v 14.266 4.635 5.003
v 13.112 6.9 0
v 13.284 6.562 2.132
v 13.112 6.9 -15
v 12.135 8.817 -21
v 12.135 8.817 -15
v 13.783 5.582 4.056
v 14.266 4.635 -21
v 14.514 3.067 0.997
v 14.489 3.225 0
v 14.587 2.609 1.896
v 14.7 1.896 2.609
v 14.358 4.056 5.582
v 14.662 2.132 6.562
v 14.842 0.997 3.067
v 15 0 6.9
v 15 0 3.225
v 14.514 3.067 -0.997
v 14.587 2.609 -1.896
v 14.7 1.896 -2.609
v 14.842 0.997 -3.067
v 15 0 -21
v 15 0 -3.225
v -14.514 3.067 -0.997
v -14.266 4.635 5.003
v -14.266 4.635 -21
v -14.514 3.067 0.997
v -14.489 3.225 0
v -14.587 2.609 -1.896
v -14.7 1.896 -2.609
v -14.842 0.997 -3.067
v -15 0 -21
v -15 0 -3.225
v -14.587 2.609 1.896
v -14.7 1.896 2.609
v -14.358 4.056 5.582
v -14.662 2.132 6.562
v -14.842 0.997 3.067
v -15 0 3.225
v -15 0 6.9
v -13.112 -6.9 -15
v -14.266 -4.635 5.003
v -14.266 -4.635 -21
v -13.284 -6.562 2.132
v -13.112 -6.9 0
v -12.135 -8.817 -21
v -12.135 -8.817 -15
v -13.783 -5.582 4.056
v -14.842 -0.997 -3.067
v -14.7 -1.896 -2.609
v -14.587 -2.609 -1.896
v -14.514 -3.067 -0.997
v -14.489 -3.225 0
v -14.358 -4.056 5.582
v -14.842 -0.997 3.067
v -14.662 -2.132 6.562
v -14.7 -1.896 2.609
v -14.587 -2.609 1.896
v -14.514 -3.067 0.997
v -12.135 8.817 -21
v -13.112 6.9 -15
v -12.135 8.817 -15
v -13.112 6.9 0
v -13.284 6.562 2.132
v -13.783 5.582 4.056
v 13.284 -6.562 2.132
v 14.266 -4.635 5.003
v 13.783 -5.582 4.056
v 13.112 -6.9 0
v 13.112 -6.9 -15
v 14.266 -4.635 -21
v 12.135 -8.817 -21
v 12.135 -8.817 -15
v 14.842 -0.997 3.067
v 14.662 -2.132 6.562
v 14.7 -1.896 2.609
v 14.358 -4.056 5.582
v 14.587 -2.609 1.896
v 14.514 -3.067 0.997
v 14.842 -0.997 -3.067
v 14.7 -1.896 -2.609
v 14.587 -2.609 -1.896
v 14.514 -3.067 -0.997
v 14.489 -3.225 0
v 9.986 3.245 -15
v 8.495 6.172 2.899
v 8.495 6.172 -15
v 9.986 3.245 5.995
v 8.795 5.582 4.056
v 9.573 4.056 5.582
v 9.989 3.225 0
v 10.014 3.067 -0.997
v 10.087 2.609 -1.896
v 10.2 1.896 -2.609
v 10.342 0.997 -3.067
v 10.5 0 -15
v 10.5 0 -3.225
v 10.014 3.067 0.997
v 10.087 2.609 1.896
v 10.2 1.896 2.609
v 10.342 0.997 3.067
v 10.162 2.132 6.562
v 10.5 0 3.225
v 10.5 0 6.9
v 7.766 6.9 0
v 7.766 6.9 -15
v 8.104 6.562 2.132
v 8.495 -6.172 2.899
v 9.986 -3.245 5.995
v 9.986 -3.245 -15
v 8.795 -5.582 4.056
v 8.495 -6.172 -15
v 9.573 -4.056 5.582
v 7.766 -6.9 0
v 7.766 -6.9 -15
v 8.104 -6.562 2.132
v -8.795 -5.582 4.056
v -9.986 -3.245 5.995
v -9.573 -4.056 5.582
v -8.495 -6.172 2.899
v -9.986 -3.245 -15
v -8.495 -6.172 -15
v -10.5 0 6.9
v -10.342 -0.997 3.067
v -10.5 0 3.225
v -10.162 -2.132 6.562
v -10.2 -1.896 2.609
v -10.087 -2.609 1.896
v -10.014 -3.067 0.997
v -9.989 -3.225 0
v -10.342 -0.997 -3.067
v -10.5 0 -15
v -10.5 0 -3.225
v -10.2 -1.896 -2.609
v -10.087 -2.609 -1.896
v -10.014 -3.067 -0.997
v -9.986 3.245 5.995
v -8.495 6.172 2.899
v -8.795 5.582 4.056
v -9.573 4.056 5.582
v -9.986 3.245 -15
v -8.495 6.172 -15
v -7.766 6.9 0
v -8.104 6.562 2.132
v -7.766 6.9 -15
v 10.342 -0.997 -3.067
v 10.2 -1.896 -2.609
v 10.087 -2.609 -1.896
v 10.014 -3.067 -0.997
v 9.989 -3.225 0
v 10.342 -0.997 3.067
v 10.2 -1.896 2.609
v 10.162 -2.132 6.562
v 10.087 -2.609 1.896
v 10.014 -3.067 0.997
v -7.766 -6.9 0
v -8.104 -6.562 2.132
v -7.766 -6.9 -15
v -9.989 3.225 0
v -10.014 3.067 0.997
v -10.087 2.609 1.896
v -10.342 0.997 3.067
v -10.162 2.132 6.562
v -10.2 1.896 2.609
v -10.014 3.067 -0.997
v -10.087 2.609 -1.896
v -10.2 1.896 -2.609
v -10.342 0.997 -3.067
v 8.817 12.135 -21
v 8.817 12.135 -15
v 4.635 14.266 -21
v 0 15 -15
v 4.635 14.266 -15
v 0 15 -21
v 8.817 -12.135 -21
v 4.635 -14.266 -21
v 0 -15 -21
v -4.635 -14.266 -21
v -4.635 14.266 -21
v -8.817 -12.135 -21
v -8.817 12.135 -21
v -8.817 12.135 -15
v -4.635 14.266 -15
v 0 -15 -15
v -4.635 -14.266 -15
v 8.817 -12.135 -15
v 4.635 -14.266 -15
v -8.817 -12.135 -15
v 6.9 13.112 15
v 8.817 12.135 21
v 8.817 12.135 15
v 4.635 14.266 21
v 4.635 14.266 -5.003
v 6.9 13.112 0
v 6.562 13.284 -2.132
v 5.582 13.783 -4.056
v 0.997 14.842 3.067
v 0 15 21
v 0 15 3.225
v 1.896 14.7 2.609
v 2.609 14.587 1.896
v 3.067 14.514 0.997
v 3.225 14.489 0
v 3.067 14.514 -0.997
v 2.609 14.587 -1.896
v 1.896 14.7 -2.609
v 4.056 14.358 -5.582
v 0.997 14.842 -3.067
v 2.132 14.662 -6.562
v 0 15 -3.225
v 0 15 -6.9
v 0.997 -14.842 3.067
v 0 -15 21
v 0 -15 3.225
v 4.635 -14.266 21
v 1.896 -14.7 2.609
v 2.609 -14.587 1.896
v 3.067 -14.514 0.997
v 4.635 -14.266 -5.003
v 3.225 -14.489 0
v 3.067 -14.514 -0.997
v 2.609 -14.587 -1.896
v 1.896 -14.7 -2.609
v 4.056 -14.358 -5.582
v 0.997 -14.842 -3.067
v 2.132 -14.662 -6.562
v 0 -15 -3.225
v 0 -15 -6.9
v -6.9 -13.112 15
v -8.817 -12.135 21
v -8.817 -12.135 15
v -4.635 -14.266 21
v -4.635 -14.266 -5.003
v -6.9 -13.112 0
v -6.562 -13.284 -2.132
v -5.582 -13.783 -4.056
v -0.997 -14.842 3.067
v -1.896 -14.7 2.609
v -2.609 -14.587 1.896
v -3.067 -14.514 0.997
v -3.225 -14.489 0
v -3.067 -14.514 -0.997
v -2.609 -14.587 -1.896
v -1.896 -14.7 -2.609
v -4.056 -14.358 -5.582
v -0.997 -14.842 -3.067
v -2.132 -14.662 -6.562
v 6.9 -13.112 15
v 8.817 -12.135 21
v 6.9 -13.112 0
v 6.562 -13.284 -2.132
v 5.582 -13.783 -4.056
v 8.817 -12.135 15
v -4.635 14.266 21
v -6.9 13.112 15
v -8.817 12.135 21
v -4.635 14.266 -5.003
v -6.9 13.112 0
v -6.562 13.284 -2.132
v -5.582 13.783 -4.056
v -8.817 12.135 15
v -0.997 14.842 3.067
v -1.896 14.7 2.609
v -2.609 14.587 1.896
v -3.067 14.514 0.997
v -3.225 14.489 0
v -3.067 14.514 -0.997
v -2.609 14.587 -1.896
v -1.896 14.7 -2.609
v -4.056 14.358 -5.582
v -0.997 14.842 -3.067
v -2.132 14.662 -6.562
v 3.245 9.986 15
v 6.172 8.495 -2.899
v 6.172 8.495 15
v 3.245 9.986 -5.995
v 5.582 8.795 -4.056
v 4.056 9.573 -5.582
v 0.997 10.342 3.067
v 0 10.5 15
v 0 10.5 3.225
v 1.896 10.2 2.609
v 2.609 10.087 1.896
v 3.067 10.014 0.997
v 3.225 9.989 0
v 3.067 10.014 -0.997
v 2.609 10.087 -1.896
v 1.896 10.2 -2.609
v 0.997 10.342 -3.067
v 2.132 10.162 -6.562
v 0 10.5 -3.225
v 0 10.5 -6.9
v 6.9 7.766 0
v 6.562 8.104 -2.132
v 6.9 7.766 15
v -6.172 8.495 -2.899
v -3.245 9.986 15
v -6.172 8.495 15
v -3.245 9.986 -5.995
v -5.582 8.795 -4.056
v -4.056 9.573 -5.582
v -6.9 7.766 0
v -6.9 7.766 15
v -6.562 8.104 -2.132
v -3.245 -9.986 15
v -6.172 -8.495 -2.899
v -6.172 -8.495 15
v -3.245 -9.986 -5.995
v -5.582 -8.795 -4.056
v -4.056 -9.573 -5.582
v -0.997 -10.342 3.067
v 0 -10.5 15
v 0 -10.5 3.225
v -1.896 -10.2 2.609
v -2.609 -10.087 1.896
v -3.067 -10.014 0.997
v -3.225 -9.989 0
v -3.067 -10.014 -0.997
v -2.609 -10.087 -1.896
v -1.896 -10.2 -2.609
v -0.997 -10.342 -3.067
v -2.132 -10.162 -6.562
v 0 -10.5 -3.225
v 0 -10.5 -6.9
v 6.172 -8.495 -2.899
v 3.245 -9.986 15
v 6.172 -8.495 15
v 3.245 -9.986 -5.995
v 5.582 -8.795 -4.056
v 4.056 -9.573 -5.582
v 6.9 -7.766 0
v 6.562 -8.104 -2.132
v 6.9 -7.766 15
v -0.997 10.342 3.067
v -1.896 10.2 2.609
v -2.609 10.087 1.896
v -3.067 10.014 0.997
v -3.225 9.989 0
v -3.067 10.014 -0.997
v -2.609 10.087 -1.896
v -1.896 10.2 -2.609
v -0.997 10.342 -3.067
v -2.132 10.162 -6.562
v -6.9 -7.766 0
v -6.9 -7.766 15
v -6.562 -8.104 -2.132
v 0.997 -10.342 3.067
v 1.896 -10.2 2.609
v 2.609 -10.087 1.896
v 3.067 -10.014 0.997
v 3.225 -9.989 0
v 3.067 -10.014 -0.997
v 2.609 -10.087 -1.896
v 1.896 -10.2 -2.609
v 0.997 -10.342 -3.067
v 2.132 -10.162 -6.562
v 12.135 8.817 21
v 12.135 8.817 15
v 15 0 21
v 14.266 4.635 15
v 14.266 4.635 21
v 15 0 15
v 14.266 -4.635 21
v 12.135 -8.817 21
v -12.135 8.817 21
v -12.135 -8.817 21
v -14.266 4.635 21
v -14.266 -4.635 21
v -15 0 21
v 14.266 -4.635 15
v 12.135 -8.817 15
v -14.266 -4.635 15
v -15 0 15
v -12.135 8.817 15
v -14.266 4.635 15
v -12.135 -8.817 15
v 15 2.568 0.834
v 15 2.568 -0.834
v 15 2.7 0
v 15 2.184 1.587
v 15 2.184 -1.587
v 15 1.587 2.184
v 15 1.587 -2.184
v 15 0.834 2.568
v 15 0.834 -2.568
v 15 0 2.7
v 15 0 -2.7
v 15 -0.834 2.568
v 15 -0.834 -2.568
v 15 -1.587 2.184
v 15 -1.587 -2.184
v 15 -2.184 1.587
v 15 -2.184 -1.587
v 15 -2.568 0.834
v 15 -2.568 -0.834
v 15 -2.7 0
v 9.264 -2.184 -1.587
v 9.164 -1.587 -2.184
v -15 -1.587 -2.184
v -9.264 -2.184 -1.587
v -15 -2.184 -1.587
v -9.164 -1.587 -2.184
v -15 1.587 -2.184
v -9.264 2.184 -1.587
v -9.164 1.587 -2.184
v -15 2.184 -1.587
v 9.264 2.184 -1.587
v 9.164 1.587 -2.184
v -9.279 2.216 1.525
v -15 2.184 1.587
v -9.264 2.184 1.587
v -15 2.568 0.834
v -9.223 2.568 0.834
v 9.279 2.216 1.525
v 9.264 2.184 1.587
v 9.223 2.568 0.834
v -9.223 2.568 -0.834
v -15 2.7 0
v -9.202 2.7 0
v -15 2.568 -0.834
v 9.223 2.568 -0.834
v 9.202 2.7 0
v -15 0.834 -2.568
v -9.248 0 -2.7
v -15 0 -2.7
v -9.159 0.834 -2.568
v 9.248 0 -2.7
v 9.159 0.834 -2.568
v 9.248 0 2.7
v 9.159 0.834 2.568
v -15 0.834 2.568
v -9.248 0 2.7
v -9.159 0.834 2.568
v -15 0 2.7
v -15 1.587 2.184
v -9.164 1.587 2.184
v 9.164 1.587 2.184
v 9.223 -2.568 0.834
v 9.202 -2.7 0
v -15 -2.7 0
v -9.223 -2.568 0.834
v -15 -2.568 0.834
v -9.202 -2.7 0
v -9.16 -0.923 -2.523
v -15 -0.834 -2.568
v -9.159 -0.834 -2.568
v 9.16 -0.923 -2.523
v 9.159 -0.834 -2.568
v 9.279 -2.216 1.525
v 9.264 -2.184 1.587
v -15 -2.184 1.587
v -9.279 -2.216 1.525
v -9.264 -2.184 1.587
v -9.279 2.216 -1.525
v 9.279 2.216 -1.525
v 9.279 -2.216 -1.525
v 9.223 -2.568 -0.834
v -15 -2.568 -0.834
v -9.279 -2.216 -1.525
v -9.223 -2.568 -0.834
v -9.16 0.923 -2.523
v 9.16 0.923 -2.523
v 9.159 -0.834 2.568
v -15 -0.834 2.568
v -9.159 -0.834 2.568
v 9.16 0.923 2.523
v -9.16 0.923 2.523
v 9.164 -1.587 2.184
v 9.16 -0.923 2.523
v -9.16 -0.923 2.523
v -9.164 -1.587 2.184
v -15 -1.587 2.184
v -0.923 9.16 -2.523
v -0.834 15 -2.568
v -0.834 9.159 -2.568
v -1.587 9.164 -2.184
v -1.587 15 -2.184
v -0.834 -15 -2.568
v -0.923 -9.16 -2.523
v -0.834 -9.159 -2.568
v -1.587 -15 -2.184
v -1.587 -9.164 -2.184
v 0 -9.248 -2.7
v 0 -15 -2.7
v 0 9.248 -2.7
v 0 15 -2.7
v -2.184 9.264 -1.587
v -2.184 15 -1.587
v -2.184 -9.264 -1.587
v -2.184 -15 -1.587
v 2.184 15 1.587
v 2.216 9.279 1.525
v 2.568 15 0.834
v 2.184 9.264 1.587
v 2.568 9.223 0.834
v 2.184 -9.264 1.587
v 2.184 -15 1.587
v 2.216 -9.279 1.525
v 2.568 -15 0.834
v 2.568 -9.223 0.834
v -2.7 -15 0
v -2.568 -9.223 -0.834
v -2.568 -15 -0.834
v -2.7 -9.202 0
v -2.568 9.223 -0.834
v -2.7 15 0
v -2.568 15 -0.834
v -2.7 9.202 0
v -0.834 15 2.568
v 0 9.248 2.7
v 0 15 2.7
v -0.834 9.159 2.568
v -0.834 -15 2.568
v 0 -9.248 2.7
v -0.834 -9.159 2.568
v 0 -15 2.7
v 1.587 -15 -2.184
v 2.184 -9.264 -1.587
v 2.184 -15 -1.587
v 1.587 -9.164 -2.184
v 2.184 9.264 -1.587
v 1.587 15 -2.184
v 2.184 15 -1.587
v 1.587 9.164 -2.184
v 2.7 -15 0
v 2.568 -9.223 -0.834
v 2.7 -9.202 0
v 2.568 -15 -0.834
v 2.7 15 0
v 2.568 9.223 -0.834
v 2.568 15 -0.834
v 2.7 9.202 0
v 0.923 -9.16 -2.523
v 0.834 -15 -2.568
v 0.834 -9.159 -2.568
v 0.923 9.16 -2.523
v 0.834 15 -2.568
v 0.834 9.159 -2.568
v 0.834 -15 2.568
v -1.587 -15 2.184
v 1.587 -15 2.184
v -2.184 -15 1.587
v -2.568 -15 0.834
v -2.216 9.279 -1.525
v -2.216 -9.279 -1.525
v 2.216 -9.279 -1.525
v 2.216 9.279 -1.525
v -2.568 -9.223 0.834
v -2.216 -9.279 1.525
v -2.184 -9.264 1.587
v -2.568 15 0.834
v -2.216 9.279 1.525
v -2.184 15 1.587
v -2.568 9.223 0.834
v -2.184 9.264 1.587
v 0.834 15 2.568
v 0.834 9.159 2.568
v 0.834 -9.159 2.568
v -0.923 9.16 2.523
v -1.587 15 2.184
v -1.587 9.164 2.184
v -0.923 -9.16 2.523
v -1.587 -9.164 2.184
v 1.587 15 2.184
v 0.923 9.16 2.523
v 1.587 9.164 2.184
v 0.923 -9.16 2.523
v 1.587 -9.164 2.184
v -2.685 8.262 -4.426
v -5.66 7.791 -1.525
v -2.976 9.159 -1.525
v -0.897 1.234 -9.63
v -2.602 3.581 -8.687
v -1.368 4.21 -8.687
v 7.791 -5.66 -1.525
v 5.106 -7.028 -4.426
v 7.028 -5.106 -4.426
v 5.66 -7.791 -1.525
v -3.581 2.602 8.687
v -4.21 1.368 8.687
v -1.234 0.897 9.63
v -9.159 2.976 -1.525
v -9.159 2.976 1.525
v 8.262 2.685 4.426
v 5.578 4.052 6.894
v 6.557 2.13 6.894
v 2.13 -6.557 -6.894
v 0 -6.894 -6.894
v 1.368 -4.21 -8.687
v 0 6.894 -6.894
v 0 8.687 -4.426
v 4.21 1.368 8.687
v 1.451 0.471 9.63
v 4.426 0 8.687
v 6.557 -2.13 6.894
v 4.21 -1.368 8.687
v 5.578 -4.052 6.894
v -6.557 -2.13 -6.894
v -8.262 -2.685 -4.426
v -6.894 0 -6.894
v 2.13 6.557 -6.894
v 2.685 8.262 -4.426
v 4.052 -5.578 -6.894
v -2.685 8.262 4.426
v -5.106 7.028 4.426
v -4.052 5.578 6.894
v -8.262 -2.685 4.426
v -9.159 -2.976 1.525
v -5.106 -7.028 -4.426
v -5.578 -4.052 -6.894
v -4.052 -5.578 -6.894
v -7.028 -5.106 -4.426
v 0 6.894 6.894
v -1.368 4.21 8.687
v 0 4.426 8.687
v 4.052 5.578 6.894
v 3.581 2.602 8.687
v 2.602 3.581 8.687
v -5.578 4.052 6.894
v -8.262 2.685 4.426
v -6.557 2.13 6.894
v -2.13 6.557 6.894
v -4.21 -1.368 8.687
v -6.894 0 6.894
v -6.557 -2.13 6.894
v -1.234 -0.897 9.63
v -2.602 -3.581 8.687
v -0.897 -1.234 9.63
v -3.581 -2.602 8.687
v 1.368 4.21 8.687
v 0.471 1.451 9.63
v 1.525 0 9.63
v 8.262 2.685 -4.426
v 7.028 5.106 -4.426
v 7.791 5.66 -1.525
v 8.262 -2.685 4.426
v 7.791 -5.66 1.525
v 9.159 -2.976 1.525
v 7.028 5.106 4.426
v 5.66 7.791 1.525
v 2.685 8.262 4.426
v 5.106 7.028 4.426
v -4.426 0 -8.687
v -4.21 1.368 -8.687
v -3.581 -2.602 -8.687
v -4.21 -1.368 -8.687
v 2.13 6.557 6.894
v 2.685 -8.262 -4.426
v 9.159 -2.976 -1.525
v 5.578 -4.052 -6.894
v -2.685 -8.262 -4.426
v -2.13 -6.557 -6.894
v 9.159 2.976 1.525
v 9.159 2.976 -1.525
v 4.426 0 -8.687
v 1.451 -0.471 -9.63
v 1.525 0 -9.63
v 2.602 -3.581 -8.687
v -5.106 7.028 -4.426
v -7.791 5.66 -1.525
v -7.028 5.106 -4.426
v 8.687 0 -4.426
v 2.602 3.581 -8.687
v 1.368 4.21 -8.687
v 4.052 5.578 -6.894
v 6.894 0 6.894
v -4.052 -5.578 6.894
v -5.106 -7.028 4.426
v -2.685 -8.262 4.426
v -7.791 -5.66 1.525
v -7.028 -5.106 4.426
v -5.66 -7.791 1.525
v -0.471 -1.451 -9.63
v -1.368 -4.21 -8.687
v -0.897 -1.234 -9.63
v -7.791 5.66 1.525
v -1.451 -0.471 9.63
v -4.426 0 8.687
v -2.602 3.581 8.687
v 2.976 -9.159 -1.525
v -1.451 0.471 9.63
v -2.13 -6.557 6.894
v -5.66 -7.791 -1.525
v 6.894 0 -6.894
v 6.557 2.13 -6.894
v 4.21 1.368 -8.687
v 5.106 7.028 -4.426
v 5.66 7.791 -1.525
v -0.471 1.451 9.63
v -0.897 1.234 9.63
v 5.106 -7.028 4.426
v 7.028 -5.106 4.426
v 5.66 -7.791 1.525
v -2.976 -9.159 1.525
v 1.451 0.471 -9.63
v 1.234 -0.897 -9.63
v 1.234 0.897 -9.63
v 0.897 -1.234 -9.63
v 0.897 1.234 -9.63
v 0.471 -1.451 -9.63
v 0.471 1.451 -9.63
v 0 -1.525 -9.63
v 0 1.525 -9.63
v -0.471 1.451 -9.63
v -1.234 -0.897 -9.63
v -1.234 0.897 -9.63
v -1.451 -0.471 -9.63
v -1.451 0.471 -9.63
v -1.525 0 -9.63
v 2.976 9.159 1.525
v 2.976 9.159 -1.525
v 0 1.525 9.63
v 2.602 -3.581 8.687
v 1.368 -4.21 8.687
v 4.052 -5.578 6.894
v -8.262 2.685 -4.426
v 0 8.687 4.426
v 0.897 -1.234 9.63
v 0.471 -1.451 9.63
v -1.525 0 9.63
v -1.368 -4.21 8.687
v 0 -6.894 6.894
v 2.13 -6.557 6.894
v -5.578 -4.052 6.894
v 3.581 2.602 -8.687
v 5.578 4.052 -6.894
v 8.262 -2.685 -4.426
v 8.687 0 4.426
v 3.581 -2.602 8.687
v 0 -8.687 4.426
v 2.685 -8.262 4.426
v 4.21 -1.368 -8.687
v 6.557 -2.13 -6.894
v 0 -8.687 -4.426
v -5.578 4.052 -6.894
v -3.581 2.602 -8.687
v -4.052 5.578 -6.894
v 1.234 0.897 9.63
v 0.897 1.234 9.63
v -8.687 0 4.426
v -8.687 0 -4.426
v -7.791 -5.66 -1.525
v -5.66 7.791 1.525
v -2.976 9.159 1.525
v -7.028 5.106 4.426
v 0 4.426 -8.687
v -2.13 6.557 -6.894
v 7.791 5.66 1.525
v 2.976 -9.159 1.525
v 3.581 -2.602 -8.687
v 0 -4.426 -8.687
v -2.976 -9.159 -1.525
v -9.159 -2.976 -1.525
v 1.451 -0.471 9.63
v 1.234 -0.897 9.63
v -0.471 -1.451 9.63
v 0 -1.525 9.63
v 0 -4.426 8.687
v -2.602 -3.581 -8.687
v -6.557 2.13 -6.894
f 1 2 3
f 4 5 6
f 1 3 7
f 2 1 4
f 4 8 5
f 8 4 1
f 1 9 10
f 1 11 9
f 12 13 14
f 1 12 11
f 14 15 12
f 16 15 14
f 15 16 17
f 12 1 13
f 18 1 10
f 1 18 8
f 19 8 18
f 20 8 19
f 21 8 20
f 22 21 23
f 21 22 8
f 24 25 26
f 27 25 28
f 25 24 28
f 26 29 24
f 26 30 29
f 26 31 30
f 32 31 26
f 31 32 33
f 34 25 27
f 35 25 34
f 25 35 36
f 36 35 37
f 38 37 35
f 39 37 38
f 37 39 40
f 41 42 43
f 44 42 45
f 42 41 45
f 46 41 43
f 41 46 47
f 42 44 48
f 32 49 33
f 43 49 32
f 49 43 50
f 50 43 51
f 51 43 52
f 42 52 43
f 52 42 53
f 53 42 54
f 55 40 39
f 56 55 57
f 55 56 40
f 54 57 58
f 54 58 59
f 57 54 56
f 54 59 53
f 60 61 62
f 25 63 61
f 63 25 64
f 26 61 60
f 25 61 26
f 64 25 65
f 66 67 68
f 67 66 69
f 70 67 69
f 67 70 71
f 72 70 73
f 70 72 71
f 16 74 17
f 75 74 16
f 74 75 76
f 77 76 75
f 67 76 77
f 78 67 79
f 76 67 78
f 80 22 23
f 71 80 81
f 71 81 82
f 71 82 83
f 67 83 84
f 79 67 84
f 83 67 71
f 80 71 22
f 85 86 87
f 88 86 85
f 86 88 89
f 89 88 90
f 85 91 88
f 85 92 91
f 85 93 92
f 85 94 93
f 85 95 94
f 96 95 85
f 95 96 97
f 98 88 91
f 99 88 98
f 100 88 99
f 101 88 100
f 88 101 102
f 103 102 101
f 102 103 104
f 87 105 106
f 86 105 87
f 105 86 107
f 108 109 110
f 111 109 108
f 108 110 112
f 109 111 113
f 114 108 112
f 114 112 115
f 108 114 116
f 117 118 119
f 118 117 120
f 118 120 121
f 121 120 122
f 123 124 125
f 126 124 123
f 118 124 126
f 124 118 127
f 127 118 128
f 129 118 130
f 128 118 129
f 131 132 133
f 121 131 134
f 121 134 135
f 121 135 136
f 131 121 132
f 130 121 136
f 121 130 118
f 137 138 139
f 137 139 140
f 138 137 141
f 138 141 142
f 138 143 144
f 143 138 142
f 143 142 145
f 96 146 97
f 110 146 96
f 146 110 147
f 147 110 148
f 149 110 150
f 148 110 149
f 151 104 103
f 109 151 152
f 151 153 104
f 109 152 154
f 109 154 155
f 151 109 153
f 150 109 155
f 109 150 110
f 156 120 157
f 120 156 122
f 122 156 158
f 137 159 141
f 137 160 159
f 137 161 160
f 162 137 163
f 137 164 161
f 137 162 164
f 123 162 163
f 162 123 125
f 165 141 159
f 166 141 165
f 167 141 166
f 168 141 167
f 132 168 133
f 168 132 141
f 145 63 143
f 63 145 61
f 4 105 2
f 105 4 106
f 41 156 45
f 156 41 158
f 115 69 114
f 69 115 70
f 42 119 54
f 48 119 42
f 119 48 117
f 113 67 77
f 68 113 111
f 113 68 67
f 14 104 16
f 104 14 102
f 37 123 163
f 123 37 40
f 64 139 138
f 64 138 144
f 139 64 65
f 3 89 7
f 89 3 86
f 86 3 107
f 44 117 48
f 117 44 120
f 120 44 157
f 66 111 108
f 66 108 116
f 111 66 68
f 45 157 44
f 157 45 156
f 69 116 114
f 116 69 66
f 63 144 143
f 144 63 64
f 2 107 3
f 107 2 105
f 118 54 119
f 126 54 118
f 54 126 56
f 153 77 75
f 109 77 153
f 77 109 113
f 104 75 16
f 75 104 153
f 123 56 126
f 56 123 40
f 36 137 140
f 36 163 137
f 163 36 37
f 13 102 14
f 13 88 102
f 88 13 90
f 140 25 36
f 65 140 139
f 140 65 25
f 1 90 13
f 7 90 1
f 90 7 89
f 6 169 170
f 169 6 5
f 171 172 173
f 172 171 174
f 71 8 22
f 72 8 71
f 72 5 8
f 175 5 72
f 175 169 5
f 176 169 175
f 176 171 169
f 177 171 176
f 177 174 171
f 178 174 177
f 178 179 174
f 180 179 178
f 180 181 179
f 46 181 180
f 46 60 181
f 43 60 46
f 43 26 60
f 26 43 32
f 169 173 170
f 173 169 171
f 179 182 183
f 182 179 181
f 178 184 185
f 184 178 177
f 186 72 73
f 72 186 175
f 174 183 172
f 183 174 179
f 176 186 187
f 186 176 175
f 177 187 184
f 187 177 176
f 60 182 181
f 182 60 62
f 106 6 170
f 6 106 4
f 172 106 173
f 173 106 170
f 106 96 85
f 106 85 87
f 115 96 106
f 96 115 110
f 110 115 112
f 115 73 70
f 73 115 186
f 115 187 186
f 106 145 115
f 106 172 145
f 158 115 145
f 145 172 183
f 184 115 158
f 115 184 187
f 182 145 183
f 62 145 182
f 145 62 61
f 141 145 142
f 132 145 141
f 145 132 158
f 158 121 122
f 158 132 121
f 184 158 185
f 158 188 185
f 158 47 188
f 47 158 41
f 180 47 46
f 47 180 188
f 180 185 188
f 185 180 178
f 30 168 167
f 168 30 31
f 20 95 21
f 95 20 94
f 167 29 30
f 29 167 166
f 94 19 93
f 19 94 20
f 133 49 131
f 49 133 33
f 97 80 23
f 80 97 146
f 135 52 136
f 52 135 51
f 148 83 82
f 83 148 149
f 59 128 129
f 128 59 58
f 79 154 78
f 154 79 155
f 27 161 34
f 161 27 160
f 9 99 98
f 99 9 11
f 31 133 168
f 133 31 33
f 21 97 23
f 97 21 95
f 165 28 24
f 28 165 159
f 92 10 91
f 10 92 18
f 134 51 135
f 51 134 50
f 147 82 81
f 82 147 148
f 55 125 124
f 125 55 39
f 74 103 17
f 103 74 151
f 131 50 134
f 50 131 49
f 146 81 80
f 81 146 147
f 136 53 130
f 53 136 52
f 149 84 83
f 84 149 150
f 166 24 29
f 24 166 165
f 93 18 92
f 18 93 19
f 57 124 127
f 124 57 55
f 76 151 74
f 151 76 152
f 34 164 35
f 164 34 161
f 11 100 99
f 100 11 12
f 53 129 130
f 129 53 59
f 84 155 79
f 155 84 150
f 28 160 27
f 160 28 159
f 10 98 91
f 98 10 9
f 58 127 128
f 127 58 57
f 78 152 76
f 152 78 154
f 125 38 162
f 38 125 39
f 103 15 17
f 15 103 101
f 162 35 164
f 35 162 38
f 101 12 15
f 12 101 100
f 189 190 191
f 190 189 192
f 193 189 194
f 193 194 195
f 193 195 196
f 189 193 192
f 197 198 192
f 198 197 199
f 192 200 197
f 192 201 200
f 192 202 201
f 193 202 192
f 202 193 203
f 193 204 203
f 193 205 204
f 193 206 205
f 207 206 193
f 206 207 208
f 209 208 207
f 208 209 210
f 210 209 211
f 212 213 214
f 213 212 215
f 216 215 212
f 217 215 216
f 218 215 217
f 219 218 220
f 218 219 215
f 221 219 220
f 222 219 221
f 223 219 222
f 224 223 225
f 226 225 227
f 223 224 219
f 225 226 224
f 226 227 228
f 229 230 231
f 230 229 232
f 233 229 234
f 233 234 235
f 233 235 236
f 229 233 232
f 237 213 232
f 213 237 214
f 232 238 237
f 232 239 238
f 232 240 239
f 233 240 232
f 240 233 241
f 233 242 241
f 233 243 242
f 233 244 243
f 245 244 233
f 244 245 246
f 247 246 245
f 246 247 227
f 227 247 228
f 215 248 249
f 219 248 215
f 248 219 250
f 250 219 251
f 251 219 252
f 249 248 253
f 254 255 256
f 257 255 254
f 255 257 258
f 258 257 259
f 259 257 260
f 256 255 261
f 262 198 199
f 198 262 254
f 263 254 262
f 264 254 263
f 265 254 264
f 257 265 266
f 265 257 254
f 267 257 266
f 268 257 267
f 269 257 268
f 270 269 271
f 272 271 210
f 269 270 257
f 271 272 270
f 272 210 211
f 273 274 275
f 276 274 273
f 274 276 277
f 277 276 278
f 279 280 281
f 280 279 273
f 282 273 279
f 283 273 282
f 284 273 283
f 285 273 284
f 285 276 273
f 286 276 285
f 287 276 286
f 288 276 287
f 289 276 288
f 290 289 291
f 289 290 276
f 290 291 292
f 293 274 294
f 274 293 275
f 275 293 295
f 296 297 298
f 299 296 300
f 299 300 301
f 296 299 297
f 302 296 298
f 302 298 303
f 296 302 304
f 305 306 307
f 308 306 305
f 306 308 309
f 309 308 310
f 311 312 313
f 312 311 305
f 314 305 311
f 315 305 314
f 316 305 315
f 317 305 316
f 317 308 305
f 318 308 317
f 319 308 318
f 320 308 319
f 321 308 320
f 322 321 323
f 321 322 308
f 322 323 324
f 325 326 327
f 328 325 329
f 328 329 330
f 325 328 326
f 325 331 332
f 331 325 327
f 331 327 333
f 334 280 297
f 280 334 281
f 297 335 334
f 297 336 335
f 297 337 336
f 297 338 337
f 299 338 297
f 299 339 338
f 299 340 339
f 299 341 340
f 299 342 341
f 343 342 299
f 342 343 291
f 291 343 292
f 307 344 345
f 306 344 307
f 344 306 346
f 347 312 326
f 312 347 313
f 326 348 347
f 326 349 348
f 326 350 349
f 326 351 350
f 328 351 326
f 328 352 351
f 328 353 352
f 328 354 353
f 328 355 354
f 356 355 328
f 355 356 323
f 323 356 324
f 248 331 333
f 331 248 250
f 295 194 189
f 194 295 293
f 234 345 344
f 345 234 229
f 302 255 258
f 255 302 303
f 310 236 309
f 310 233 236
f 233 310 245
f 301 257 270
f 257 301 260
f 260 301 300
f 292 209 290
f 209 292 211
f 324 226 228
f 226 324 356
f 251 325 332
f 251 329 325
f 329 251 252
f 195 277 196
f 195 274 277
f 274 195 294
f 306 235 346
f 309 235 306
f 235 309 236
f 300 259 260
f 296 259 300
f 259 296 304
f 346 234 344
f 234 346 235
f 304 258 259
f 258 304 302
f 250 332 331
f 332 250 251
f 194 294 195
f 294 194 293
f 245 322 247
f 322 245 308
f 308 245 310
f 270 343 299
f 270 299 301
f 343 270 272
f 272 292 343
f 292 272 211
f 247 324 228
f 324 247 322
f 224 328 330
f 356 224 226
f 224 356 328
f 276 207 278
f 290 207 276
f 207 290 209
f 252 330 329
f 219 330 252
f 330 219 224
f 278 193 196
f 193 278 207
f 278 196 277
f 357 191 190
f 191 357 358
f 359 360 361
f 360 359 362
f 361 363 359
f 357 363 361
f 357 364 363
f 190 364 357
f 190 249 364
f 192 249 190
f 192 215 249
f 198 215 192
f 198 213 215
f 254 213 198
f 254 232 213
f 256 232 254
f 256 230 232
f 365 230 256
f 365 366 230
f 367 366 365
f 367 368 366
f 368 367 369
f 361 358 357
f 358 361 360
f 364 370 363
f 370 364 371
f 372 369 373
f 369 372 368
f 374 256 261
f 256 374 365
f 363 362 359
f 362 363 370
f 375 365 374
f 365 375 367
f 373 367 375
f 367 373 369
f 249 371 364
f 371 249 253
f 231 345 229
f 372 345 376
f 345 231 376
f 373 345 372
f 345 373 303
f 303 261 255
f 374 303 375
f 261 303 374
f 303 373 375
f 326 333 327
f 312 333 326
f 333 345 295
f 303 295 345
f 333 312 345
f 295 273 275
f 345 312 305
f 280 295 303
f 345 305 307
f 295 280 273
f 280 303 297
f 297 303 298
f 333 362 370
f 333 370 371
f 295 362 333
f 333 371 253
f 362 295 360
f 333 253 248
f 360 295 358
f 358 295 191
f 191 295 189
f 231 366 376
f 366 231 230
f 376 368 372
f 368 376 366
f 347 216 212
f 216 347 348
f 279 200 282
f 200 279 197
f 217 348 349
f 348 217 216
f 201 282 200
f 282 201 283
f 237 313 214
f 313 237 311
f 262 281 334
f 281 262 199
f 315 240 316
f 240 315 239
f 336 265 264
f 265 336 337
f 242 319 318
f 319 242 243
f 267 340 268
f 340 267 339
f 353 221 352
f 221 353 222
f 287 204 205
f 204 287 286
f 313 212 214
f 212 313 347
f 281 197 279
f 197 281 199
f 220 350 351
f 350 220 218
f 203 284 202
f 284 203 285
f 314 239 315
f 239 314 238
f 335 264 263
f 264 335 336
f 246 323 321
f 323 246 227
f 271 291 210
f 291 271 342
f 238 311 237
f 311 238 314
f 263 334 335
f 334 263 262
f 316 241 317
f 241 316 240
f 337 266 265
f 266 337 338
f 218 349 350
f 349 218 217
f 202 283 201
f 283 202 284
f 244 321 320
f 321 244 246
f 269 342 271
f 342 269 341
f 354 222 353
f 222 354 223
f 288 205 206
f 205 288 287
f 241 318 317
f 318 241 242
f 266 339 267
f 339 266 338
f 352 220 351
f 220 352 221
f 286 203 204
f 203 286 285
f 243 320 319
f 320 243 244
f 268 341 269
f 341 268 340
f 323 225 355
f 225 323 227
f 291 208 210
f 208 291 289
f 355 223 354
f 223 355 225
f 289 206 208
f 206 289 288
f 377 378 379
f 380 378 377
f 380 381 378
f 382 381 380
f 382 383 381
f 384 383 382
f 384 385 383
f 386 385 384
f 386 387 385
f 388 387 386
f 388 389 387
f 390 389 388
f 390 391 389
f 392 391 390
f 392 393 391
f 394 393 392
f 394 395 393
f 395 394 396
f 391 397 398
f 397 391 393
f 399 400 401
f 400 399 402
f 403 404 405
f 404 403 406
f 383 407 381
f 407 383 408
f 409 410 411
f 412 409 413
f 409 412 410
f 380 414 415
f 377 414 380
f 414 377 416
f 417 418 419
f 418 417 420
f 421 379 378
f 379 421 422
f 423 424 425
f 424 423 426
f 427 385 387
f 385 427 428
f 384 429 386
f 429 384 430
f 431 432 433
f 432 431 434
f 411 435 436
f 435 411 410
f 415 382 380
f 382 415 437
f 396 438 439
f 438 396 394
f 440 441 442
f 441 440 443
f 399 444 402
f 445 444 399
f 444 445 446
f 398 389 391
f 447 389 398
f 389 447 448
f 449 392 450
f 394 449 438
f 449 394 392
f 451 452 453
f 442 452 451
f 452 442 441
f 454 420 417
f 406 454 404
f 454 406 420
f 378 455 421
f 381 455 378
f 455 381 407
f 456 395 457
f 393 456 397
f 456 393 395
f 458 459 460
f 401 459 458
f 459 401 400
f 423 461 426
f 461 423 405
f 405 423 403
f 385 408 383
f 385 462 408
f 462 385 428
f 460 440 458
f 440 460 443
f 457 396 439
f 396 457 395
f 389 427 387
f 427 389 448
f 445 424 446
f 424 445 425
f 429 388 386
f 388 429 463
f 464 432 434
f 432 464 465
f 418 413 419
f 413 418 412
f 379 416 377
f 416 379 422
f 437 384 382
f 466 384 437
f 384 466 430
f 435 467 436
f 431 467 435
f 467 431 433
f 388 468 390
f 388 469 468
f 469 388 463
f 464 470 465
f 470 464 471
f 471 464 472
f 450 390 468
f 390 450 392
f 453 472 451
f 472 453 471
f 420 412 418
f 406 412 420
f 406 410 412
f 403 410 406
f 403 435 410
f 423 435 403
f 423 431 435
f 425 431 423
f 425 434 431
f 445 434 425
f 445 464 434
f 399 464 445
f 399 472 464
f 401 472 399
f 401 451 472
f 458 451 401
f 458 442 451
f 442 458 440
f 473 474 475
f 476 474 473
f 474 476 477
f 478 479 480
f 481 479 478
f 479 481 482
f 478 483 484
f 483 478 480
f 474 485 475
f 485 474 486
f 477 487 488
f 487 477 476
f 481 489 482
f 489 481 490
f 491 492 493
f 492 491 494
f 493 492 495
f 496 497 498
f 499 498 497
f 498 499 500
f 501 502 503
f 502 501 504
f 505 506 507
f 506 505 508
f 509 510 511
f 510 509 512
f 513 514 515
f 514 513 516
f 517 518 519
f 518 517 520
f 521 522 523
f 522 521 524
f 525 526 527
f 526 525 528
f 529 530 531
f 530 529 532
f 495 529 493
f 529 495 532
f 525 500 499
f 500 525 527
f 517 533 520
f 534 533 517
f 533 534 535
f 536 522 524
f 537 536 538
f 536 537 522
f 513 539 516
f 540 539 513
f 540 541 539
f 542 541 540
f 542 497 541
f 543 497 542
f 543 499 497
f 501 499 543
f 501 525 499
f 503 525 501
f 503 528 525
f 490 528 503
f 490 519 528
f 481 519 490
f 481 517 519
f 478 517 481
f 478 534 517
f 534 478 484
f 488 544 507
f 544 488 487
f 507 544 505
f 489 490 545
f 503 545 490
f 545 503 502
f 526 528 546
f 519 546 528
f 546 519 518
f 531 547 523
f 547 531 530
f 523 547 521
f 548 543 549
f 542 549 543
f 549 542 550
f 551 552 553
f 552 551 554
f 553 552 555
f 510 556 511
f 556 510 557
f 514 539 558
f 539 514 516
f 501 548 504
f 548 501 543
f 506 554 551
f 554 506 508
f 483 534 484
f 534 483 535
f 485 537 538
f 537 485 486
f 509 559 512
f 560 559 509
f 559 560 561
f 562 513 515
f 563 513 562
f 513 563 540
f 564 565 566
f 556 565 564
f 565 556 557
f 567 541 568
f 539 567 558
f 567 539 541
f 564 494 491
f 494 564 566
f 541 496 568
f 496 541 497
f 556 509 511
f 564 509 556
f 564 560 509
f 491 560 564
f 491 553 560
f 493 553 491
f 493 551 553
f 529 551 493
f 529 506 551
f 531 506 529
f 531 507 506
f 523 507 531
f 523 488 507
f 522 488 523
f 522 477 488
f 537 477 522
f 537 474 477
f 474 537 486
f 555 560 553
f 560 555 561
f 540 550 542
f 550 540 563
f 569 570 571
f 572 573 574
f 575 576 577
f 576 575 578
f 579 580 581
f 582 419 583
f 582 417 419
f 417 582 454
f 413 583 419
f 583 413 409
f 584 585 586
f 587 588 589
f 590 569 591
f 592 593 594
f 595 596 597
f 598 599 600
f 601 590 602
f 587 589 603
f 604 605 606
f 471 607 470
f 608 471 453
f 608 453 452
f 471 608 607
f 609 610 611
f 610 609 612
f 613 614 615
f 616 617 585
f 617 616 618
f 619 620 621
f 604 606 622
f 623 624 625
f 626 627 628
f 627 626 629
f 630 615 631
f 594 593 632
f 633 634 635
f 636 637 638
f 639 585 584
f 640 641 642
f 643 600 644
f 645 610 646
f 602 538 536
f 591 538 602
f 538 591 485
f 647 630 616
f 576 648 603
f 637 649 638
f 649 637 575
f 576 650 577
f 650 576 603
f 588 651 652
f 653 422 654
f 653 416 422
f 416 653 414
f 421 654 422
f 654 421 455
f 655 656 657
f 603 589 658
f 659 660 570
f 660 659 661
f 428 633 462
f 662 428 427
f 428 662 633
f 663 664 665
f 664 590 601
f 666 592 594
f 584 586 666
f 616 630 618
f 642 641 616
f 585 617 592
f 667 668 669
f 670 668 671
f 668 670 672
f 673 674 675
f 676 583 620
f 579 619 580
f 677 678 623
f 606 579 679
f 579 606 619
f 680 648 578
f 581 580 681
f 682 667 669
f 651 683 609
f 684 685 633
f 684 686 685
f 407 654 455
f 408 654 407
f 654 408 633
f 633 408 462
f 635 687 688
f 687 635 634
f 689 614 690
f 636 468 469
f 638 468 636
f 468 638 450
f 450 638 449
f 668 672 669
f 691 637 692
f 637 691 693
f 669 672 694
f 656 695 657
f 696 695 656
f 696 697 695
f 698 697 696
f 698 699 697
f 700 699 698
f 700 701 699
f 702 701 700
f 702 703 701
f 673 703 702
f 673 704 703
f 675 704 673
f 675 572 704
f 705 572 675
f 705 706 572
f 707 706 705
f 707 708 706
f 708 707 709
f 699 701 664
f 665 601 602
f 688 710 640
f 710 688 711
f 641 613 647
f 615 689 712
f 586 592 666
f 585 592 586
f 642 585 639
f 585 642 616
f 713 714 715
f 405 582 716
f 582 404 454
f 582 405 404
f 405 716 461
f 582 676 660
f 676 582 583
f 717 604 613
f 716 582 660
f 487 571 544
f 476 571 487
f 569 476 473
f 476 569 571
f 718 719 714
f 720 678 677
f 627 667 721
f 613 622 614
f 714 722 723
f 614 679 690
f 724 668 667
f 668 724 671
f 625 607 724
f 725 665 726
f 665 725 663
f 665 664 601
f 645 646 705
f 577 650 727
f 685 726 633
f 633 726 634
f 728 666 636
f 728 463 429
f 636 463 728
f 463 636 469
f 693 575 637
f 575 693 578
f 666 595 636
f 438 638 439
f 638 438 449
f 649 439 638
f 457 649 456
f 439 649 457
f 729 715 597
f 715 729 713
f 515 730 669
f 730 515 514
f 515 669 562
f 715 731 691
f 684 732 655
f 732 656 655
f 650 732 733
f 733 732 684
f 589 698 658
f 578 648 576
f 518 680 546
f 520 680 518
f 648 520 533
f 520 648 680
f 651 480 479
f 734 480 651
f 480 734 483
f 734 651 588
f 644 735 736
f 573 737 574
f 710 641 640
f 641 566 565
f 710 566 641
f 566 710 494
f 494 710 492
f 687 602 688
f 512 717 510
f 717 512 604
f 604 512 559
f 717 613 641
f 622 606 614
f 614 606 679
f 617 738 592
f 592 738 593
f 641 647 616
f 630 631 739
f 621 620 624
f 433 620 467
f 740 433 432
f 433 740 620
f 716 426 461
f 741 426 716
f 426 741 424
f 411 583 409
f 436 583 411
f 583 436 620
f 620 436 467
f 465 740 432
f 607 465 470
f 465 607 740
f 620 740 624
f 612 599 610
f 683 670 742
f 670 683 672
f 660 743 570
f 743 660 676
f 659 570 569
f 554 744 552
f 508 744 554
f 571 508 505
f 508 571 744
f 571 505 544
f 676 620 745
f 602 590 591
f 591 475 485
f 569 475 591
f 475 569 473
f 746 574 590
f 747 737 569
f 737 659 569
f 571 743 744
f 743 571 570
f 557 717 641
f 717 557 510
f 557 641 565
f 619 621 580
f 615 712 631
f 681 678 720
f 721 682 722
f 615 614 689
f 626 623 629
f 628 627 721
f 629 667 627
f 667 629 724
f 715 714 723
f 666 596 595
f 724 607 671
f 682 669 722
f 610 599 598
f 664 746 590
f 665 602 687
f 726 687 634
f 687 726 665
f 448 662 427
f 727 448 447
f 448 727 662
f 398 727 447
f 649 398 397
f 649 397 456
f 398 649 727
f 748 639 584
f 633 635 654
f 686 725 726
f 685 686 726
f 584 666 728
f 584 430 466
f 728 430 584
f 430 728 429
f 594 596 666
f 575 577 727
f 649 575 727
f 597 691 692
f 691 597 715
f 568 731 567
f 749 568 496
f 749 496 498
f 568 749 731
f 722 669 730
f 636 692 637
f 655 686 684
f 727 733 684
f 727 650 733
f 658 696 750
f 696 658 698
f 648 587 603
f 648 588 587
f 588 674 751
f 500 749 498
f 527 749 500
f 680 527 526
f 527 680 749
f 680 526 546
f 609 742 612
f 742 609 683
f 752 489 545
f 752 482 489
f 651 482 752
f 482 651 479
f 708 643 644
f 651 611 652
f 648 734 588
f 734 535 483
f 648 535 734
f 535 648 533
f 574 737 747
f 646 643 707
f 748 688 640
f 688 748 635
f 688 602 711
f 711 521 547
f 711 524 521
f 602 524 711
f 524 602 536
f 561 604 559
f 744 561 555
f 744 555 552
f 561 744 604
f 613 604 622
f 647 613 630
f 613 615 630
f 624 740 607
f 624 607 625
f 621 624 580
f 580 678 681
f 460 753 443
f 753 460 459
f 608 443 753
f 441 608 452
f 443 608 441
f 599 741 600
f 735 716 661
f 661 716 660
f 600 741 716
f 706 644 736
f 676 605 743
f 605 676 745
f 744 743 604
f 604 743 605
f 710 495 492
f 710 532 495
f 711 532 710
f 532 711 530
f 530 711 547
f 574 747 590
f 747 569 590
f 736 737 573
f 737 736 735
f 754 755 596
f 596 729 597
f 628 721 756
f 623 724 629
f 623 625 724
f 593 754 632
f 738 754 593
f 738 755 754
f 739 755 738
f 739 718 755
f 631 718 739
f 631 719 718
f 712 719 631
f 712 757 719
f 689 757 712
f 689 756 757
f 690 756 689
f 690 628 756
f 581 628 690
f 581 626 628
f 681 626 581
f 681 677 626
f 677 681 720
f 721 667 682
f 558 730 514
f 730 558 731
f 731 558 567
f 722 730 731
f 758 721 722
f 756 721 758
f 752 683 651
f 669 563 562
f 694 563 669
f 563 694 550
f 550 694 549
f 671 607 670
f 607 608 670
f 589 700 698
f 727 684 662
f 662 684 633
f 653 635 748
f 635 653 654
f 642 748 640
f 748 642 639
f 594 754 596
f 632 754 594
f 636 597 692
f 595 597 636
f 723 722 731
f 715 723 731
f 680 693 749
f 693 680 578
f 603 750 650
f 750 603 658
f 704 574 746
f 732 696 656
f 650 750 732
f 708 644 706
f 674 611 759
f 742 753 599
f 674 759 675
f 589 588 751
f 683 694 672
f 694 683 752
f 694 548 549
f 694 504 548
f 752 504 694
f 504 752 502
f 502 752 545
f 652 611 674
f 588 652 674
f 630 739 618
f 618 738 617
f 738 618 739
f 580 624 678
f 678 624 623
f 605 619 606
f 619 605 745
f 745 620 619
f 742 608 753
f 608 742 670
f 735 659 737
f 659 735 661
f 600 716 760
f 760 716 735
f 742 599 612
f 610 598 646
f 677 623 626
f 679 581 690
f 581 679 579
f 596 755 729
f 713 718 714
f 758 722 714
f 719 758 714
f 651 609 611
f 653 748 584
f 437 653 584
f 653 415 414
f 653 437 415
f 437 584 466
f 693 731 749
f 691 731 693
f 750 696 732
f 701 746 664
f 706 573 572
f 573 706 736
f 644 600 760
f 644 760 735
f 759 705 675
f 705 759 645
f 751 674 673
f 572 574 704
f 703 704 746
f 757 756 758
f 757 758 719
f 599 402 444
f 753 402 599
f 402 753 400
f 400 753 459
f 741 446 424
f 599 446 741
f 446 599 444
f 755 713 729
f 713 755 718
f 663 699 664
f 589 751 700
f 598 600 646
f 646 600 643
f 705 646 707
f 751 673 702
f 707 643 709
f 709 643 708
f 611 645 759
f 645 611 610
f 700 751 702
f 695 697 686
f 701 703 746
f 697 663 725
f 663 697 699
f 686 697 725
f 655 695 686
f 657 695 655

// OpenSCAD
/*
	This is a OpenSCAD Library for generating u-joints

	Usage:
		Where R is the radius of the ujoint, the ujoint will have a length of R*1.40
			
		The NOZZLE_SIZE is used to calculate the clearence for the cross bars. 
		
		ujoint(R=10);

	License: Creative Commons
	Link: http://www.thingiverse.com/celer/designs
   Version: 0.2

	Tested and verified working 15mm-40mm/w 0.35mm nozzle and 2mm support distance

	

*/ 

module mount(R=10,NOZZLE_SIZE=0.35){
	difference(){
		union(){
			cylinder(r=R/2,h=R*0.20,center=true,$fn=20);

			intersection(){
	   			difference(){
					cylinder(r=R/2,h=R*1.90,$fn=20);
	   				cylinder(r=R/2*0.70,h=R*.90,$fn=20);
	   			}
	   			union(){
					translate([0,0,R*.30]) cube([R,R*0.46,R*0.60],center=true,$fn=20);
	   				translate([0,0,R*0.60]) rotate([0,90,]) cylinder(r=R*0.23,h=R,center=true,$fn=20);
				}
			}
		}
		translate([0,0,R*0.60]) rotate([0,90,0]) cylinder(r=(R*0.09)+NOZZLE_SIZE*1.5,h=R*1.10,center=true,$fn=20);
	}
}



module ujoint(R=10){
	translate([0,0,R*-0.60]){
		translate([0,0,R*0.60]) rotate([0,90,]) cylinder(r=R*0.09,h=R,center=true,$fn=20);
		translate([0,0,R*0.60]) rotate([0,90,90]) cylinder(r=R*0.09,h=R,center=true,$fn=20);
		translate([0,0,R*0.60]) sphere(r=R/2*0.65,$fn=20);
		mount(R);
		translate([0,0,R*1.20]) rotate([180,0,90]) mount(R);
	}
}


ujoint(R=30);
